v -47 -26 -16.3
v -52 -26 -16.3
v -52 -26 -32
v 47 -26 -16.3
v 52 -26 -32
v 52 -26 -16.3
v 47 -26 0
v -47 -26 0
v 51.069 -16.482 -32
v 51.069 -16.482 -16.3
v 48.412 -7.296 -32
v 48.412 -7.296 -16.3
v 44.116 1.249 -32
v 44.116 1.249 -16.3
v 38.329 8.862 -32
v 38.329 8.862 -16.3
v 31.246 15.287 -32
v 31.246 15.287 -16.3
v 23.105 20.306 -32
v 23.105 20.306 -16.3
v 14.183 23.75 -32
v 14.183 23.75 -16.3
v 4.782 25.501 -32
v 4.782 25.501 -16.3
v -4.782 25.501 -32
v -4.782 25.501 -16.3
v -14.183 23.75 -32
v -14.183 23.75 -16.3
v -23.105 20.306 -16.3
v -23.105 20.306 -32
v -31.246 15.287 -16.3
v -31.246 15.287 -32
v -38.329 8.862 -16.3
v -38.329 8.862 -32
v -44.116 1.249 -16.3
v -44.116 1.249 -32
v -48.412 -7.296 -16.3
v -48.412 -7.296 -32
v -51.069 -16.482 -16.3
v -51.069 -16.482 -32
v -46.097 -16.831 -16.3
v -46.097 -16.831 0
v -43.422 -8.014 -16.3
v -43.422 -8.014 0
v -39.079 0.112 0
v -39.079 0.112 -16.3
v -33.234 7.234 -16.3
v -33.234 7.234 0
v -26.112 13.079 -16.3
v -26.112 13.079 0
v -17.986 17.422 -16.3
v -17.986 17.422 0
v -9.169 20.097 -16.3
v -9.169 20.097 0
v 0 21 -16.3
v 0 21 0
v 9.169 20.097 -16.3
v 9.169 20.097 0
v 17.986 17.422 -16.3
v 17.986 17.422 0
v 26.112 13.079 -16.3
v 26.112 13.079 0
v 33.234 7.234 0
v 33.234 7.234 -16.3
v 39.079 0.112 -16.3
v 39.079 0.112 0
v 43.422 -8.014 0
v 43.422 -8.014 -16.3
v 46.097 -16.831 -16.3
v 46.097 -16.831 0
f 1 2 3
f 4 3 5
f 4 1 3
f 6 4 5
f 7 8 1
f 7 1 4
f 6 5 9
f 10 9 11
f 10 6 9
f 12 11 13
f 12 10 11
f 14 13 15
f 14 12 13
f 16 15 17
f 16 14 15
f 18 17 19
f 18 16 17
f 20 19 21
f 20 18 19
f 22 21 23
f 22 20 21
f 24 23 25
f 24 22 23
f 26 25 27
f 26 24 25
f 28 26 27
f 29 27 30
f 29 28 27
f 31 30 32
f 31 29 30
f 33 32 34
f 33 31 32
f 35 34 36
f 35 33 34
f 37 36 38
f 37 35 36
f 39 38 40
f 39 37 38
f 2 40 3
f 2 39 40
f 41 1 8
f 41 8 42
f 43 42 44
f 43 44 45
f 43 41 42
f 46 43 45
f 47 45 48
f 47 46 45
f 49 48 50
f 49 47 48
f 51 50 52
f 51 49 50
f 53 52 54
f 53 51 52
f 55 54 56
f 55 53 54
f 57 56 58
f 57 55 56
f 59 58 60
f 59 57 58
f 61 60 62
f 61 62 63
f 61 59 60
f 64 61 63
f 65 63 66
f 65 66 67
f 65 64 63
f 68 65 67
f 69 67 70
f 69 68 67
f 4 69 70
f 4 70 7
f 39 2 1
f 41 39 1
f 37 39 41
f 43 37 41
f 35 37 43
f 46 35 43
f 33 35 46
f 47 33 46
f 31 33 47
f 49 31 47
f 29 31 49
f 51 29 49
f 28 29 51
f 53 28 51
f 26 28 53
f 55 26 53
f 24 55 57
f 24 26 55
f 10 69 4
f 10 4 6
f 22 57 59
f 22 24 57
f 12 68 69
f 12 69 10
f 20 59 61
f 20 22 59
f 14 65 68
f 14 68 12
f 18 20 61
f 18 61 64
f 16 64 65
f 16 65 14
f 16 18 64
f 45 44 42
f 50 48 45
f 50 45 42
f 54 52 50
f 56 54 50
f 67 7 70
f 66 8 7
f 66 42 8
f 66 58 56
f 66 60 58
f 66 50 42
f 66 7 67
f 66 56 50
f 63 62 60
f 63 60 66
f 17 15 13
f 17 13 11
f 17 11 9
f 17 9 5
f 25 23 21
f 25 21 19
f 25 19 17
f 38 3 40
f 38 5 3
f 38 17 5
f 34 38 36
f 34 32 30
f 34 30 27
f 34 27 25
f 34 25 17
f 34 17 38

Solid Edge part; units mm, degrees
sketch "Sketch1" plane through (0, 0, 0) normal (0, 0, 1) x (1, 0, 0)
  arc A0 (-52, -26) -> (52, -26) centre (0, -26.2795) cw
  line L0 (-52, -26) -> (52, -26)
extrude "Protrusion1" add sketch "Sketch1" against normal blind 32
sketch "Sketch2" plane through (0, -0.1394, 0) normal (0, 0, 1) x (1, 0, 0)
  line L0 (-55.74, -28.2911) -> (55.74, -28.2911)
  line L1 (55.74, -28.2911) -> (55.74, 28.5699)
  line L2 (55.74, 28.5699) -> (-55.74, 28.5699)
  line L3 (-55.74, 28.5699) -> (-55.74, -28.2911)
extrude "Recorte_Extrudado_2" cut sketch "Sketch2" against normal blind 16.3
sketch "Sketch3" plane through (0, -0.1394, -16.3) normal (0, 0, 1) x (1, 0, 0)
  line L0 (-47, -25.8606) -> (47, -25.8606)
  arc A0 (-47, -25.8606) -> (47, -25.8606) centre (0, -25.8606) cw
extrude "Protrusão_Extrudada_5" add sketch "Sketch3" along normal blind 16.3
